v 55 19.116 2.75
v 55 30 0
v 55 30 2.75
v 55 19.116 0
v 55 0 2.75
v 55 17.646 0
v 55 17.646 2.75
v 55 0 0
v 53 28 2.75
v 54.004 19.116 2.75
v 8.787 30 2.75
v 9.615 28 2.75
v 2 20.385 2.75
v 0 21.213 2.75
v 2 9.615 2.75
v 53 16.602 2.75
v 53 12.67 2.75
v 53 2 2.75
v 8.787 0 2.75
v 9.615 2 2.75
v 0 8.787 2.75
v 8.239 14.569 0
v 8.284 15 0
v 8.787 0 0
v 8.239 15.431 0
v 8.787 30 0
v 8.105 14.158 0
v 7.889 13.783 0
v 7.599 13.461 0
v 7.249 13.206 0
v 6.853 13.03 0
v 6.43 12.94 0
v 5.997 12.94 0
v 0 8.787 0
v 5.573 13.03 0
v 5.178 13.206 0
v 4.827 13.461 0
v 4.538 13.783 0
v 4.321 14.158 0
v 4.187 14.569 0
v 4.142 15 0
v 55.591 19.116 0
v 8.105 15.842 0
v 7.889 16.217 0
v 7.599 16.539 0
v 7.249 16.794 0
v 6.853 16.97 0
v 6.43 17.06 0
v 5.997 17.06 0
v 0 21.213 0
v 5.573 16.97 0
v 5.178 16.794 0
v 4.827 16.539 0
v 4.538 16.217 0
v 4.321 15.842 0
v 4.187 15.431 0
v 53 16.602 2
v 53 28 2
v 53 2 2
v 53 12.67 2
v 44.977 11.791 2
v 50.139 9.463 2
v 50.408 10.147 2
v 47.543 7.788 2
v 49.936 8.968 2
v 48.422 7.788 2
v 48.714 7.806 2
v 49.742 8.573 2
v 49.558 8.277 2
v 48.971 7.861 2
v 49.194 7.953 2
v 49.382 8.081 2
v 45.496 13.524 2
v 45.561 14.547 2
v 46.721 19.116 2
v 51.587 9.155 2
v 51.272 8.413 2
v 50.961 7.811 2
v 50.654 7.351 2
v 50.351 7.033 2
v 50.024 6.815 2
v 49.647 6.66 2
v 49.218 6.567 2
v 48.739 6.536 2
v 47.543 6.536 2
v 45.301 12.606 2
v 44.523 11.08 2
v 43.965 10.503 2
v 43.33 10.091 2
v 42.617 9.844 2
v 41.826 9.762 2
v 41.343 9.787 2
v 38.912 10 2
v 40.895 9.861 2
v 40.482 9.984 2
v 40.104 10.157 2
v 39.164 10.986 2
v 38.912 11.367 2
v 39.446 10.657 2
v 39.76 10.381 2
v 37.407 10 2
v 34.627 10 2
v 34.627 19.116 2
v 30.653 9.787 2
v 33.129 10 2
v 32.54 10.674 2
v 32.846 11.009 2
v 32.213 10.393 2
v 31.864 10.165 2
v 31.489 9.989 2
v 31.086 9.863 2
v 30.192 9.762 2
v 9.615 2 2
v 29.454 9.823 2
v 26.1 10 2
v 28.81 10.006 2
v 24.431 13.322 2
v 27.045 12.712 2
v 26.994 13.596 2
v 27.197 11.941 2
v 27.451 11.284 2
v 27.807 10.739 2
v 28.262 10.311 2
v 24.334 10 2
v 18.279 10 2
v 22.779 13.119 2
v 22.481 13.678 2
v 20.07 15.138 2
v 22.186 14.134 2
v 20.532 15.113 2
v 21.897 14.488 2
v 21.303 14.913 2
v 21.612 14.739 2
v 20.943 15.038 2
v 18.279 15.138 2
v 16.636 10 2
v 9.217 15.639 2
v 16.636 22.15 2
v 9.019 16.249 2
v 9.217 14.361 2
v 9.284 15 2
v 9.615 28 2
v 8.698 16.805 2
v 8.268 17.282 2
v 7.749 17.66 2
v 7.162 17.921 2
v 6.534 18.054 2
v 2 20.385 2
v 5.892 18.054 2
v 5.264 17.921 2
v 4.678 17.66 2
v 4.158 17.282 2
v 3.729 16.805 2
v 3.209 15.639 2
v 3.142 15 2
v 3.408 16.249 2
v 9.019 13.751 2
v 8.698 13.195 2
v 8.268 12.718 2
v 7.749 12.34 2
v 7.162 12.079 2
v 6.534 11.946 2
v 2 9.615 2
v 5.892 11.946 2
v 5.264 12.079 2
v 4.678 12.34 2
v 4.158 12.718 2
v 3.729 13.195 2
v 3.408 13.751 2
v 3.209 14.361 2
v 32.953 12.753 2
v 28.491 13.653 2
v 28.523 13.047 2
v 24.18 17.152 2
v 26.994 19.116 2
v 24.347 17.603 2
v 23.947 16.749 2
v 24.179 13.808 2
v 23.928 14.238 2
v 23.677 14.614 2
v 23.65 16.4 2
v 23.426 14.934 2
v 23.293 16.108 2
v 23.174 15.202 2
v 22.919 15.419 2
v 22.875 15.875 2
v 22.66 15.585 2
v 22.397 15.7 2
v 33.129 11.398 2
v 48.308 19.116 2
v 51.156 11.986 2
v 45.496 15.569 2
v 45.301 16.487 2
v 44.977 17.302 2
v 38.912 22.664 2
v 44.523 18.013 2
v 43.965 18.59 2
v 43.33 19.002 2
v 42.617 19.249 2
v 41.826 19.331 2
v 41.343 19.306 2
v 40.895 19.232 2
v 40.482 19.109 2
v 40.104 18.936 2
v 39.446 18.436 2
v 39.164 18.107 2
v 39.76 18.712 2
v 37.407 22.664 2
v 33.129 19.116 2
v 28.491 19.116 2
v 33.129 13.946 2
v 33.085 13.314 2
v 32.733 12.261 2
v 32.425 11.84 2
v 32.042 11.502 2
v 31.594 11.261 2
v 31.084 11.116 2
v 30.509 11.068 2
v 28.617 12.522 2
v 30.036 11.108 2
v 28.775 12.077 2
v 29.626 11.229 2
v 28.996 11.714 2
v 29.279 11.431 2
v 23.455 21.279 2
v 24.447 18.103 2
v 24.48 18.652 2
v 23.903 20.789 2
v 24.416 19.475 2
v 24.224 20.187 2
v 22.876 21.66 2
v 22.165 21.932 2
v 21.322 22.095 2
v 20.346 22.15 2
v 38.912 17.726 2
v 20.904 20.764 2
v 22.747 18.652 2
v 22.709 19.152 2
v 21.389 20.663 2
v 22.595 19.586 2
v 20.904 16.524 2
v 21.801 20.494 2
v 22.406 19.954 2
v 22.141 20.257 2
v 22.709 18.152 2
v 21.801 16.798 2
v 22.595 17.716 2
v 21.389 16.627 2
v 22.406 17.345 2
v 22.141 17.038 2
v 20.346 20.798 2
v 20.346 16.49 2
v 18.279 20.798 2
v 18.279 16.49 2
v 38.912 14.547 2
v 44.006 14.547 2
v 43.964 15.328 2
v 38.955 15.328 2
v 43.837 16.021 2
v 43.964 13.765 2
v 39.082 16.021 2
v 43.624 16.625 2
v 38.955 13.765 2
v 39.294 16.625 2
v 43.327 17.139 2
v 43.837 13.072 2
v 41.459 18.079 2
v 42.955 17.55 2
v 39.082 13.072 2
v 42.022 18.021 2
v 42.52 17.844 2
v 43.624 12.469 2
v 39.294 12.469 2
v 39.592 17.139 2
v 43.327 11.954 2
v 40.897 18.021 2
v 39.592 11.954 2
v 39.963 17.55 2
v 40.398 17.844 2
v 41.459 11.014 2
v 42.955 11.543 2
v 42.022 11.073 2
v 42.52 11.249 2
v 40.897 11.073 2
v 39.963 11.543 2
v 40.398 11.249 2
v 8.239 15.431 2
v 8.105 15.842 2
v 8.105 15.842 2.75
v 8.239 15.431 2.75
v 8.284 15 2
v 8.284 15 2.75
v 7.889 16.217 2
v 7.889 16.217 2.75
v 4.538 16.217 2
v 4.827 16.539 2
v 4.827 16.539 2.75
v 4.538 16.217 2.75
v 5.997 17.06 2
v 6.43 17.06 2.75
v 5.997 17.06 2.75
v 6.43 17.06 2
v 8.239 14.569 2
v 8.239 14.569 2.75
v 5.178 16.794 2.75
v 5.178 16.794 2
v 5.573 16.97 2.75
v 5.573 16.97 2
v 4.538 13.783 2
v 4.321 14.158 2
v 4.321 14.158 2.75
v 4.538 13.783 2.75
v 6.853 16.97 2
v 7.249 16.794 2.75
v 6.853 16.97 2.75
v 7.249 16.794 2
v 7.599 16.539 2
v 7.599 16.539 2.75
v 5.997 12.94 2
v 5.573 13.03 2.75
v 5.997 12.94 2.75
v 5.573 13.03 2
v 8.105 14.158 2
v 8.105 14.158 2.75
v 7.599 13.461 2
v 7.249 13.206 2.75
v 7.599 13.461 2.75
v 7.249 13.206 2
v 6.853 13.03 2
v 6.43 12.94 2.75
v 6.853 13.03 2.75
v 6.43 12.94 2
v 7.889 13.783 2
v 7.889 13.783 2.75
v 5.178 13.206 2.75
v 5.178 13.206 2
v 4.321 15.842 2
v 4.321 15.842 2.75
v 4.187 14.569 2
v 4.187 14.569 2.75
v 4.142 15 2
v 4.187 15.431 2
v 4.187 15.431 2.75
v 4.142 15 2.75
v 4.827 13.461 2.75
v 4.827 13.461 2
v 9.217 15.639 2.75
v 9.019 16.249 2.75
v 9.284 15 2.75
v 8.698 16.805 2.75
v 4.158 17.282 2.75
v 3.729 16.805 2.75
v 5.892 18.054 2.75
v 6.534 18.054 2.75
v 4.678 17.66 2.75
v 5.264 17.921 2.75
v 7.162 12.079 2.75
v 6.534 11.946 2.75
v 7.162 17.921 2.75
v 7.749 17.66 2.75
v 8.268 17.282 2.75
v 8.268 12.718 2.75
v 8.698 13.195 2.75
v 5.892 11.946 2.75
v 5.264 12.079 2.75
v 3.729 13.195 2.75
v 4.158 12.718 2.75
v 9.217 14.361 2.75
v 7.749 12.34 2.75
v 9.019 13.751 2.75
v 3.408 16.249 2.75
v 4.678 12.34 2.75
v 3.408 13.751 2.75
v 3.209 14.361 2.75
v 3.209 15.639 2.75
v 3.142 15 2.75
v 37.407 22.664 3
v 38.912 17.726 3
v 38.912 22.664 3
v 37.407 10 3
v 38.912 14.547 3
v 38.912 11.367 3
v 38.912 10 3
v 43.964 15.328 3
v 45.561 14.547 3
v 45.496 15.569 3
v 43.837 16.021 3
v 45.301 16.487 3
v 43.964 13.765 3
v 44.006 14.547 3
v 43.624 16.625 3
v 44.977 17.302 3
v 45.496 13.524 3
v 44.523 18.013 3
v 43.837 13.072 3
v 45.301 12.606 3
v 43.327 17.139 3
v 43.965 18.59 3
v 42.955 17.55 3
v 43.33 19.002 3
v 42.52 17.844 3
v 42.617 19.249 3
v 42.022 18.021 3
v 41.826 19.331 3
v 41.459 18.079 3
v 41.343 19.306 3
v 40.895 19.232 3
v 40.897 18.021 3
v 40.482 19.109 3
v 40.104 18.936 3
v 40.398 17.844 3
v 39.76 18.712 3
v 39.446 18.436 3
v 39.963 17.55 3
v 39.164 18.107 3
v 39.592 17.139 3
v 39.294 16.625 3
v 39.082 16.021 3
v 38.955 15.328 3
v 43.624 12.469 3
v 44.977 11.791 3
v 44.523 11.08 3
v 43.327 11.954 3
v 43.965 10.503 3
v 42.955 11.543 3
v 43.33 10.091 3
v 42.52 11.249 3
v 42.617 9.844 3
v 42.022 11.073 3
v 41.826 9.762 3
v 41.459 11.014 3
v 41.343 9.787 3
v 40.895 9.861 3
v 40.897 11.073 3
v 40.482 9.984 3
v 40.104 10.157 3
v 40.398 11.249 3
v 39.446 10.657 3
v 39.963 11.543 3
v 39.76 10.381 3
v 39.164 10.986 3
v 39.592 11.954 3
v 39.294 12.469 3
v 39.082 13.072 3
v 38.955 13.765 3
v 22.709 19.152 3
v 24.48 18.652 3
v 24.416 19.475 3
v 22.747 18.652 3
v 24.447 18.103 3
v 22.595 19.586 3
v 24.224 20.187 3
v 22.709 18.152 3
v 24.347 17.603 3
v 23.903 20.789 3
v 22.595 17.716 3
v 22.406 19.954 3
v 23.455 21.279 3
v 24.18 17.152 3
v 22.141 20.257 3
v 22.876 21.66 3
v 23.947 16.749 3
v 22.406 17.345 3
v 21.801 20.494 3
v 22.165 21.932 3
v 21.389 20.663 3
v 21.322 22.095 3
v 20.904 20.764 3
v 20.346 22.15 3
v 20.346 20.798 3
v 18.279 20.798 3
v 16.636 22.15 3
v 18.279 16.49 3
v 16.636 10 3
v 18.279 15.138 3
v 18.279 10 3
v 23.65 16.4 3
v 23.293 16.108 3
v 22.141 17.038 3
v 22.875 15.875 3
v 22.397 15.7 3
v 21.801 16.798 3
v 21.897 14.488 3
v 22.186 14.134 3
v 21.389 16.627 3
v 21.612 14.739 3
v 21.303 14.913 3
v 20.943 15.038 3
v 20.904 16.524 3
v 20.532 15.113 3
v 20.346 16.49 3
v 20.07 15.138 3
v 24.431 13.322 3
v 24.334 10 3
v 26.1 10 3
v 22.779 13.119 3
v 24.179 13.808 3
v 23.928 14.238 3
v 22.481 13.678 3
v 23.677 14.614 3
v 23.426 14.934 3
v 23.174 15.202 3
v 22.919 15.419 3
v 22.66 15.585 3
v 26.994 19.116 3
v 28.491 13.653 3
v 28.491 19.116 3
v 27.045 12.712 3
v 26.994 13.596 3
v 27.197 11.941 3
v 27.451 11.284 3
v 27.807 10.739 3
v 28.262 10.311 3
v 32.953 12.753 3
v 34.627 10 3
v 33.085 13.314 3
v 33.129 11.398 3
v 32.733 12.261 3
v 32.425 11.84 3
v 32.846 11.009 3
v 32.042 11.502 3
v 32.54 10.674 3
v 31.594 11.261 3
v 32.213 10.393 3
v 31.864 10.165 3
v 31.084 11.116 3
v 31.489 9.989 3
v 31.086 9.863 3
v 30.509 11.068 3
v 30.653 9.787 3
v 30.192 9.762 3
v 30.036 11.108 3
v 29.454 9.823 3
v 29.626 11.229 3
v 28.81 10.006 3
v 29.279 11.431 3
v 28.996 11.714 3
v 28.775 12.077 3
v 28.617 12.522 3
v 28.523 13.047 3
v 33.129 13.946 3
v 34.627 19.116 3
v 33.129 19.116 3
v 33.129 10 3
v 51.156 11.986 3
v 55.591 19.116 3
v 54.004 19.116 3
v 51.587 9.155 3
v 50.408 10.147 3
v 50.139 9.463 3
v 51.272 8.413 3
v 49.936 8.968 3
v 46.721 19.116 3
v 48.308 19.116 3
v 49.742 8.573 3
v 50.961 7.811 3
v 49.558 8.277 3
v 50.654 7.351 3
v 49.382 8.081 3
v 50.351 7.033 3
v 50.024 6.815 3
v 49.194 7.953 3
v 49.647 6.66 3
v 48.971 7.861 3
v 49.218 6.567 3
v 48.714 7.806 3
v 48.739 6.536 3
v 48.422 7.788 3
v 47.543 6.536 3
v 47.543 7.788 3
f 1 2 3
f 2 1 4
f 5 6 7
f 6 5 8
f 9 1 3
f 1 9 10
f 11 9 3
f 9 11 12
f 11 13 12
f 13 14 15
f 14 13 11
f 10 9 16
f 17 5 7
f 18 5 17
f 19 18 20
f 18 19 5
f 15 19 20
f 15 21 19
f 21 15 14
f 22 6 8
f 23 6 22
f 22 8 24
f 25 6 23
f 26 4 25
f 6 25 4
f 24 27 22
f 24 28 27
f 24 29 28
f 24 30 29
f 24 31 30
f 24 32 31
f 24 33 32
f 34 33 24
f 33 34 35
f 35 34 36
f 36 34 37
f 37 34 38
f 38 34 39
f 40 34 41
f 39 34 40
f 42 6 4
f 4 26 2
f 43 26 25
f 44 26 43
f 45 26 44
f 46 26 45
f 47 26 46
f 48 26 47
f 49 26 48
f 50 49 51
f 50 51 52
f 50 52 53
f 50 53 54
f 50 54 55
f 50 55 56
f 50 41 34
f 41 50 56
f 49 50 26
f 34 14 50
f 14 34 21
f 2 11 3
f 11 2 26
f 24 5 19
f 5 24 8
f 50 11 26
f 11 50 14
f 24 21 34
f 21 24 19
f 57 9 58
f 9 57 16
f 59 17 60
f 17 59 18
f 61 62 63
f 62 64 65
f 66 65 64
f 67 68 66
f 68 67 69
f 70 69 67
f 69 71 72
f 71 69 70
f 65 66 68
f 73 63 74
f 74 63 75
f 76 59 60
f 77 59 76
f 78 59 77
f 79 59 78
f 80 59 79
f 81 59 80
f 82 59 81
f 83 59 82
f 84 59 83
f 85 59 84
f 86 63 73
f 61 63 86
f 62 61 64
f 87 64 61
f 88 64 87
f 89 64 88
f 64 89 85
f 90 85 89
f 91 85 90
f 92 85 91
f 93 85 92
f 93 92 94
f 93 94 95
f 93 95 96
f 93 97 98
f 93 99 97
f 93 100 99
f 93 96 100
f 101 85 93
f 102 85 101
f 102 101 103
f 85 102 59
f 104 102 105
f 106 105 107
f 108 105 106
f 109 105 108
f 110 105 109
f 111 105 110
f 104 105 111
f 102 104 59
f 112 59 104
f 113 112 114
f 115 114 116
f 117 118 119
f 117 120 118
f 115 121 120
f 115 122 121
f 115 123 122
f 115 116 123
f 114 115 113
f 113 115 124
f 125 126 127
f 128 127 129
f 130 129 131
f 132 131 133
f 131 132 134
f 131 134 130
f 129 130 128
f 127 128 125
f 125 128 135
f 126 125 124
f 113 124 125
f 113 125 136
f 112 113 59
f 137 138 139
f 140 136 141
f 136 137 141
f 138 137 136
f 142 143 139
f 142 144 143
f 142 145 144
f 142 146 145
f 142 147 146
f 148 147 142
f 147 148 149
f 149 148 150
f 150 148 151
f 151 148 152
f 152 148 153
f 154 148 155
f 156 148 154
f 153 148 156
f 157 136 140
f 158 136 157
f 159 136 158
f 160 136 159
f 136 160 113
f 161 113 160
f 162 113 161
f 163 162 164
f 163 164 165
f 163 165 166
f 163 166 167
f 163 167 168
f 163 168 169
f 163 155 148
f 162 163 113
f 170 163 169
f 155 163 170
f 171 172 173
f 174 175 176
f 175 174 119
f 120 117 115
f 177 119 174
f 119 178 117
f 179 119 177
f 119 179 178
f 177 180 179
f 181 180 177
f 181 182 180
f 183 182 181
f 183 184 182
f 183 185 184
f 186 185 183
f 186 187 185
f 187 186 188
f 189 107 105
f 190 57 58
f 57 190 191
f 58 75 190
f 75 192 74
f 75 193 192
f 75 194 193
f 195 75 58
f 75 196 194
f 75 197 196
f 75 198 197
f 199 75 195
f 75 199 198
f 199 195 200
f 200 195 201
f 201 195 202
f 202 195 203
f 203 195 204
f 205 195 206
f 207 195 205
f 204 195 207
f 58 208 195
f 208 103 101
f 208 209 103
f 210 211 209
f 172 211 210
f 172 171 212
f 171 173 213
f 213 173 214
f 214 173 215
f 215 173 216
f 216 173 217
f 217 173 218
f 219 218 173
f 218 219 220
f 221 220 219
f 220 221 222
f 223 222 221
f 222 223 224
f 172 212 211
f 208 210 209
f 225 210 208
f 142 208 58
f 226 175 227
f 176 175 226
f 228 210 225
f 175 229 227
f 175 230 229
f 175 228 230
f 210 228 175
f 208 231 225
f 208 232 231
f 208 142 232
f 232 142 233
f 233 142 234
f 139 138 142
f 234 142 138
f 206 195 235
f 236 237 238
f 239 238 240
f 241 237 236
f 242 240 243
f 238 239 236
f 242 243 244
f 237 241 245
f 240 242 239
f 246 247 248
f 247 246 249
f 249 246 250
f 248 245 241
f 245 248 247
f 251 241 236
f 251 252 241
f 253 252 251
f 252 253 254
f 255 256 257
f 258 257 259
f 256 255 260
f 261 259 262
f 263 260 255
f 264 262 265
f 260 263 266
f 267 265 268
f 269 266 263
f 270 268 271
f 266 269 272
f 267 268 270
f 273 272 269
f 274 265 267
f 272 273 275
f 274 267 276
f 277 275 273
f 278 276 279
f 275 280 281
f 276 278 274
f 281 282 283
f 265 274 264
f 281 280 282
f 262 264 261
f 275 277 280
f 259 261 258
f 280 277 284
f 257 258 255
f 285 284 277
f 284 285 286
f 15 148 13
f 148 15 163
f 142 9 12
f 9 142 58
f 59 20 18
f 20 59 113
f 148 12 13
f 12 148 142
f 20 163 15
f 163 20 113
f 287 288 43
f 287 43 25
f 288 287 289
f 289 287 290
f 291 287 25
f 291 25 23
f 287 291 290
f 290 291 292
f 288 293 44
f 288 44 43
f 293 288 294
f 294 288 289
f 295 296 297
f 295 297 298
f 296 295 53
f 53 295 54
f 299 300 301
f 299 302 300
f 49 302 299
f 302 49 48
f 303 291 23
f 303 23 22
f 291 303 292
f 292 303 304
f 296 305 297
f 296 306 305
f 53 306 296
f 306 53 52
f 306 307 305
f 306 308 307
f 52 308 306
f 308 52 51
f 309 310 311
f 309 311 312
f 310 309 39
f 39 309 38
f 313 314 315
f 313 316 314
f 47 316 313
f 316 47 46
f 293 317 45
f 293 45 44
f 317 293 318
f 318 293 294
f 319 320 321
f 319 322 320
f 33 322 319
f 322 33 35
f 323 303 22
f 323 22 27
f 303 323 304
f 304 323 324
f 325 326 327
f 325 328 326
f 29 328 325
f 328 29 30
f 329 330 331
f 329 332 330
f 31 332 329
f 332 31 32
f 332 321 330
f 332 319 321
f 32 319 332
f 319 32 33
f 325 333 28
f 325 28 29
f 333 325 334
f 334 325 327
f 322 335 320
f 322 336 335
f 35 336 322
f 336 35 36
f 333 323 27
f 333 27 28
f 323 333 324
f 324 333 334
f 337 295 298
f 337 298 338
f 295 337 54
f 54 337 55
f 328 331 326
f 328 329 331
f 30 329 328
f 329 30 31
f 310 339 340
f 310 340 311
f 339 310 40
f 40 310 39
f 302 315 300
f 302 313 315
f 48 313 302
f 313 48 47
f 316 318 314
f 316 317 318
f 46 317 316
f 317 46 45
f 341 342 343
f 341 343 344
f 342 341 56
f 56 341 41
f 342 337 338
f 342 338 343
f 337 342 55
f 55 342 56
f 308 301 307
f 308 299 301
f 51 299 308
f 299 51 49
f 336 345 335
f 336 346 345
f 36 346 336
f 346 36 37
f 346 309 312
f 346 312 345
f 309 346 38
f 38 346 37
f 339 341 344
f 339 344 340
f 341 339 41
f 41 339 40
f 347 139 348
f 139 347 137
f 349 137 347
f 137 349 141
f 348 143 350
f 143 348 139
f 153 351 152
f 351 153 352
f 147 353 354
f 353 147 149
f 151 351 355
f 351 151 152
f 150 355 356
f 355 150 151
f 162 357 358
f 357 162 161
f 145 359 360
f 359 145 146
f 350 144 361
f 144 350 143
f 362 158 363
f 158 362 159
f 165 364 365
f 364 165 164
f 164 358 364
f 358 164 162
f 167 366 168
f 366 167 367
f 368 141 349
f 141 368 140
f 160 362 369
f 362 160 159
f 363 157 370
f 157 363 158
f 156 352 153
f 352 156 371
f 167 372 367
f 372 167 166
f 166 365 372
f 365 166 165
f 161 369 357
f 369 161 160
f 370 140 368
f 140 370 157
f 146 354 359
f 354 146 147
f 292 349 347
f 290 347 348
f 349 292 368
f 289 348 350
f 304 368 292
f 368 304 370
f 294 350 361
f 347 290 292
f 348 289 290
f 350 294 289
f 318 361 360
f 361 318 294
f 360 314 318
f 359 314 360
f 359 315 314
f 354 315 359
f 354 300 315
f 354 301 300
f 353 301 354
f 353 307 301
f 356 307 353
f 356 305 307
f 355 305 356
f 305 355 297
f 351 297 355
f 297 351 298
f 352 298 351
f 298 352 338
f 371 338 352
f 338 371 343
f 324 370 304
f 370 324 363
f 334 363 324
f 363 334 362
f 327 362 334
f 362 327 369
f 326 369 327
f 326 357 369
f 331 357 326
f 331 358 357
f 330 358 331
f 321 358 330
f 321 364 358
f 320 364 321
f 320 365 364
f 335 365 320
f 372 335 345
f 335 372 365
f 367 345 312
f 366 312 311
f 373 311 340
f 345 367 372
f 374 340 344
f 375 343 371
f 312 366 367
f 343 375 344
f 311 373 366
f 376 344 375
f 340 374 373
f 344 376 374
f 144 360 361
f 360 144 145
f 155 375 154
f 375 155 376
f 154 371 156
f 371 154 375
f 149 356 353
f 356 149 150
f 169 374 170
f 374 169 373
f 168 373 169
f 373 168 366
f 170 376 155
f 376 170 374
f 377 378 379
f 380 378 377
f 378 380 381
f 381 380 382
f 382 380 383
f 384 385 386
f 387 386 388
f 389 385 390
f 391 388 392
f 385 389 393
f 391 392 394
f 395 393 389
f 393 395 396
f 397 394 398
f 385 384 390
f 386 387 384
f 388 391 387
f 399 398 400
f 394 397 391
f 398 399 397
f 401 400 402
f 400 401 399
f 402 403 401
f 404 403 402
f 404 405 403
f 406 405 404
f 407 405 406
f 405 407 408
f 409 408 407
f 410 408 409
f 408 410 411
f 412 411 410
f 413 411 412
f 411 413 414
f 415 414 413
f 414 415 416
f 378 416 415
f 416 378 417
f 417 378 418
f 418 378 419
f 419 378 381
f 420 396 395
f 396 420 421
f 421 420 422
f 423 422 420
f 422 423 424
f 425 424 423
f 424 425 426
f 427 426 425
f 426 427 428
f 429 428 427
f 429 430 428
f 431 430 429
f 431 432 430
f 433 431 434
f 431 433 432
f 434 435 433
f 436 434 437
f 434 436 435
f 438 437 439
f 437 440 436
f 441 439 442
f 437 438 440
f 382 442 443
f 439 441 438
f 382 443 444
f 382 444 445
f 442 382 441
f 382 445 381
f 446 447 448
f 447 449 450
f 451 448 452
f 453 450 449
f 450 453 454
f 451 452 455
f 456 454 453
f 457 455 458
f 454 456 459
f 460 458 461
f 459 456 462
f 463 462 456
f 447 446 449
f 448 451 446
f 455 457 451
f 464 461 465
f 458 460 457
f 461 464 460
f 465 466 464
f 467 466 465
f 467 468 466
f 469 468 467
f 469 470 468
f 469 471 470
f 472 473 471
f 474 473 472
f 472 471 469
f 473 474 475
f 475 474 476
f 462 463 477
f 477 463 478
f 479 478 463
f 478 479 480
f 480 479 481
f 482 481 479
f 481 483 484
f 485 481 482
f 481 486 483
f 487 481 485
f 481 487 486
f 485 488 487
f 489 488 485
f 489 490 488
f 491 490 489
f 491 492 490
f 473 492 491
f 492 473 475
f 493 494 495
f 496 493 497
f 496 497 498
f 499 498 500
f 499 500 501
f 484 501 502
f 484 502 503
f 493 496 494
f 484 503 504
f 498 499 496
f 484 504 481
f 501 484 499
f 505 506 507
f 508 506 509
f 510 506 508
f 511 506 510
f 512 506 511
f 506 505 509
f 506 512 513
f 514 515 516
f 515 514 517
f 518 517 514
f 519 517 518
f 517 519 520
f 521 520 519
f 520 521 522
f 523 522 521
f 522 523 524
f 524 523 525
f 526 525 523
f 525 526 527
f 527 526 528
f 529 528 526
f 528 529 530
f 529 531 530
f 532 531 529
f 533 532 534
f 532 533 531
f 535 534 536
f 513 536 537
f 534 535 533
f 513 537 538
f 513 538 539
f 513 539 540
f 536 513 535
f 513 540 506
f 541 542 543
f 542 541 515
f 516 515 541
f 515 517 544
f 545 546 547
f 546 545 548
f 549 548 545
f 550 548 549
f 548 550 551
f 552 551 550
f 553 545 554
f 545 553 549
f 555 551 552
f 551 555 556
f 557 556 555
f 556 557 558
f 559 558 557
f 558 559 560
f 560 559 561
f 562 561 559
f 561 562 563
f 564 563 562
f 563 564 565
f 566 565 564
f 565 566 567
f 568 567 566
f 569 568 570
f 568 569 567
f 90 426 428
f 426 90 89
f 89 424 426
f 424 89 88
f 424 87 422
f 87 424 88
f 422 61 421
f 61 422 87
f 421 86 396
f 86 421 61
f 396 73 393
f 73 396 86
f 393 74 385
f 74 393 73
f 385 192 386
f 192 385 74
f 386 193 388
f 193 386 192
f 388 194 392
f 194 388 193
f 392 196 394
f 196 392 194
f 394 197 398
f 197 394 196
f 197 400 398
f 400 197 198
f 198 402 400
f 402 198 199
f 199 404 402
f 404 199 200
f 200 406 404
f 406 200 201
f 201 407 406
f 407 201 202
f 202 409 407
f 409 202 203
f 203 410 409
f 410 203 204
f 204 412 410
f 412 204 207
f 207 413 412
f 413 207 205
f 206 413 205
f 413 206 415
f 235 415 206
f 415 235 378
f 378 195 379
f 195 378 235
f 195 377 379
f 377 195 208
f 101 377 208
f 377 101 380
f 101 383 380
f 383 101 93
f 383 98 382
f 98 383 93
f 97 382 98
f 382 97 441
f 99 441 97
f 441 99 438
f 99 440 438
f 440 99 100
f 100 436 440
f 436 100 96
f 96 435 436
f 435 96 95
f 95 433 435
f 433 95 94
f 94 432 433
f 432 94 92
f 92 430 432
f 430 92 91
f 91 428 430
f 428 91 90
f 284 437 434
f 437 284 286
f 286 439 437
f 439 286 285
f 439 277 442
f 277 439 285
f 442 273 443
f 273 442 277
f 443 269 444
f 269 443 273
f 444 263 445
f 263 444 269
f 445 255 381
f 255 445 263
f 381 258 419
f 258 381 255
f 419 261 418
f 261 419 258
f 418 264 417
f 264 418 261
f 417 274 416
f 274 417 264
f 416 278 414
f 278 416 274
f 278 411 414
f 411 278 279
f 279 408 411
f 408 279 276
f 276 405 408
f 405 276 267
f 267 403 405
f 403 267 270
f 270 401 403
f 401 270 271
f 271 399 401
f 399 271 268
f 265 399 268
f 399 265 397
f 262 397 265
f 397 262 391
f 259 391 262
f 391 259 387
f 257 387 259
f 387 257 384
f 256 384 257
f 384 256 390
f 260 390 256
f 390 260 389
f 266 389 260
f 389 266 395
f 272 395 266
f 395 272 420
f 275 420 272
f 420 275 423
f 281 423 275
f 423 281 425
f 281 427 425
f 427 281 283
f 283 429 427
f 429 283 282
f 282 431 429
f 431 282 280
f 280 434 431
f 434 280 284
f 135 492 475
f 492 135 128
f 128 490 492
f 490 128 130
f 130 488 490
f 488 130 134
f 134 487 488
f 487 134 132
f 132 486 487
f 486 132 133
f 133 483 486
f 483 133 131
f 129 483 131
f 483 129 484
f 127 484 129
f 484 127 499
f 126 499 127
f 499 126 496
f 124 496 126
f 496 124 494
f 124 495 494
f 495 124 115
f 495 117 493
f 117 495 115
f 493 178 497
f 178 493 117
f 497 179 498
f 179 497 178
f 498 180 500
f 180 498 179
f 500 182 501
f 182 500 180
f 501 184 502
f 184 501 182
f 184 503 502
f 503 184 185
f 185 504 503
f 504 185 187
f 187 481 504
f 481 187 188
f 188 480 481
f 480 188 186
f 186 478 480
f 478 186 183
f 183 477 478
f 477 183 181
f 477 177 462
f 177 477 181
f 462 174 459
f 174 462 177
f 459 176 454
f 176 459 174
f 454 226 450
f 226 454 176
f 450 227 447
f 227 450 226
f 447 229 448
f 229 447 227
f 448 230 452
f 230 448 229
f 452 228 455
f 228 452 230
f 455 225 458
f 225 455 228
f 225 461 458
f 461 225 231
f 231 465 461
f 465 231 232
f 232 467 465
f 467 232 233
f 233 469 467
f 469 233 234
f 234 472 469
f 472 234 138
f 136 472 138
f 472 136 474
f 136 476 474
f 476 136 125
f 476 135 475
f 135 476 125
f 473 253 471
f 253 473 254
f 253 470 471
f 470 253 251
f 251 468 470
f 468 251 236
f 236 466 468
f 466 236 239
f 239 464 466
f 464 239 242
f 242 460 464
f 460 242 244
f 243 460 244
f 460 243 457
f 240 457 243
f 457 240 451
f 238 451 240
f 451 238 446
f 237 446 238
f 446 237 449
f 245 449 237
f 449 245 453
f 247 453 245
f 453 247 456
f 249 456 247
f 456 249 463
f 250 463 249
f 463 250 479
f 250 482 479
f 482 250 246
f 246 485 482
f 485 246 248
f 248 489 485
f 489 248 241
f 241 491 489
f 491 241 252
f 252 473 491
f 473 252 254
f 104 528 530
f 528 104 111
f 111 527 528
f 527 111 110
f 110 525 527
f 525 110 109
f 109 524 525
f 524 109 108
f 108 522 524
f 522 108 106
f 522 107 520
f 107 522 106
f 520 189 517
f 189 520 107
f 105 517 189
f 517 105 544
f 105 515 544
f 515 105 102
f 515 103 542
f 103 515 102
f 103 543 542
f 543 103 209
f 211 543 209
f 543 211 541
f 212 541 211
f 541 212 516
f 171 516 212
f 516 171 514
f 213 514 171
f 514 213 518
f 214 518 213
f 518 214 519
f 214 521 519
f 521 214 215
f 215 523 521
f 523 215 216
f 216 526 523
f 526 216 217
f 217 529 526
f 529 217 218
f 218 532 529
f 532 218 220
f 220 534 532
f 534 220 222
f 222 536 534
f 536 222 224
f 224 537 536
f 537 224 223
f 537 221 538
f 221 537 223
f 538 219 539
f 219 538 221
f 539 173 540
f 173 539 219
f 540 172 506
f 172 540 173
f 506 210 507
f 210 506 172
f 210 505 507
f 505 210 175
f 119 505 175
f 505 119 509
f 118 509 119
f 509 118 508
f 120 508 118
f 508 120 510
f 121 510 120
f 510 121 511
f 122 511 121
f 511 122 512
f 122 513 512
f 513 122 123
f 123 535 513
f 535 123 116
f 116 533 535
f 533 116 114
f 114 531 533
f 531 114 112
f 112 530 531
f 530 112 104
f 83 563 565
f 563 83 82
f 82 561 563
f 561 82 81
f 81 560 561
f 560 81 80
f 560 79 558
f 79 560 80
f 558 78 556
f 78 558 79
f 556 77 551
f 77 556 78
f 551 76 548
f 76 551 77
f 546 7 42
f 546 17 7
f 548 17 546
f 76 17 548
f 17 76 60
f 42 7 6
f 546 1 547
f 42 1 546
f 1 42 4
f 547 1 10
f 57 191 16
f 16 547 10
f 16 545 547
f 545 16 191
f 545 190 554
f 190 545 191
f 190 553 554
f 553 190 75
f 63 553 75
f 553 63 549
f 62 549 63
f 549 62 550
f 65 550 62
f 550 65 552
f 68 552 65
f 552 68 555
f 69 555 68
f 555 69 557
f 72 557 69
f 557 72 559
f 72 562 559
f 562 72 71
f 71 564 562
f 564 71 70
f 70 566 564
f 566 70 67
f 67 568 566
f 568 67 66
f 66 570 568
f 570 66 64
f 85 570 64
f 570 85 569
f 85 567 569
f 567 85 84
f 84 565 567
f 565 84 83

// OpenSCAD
//Personalized and Parameterized Gift Tags
//By Brad Wagner (c) 2012
//Creative Commons License, yada yada.

//I made these for my new printer for Christmas giving/showing off. Damn I'm good. :P

//Print these with a 2 solid layers top and bottom and one perimeter for best results.

/*[Text]*/
tag_name="Ruby";

tag_width = 55; //[25,30,35,40,45,50,55,60,65,70,75,80,85,90,95,100,105,110,115,120,125,130,135,140,145,150,155,160,165,170]

tag_height = 30; //[5,10,15,20,25,30,35,40,45,50]

text_centering_height = 10; 

text_centering_left_to_right = 15; 

What_font="Yesteryear"; //[Abril Fatface,Aclonica,Acme,Advent Pro,Akronim,Aladin,Alegreya,Alegreya Sans,Alegreya SC,Alex Brush,Alfa Slab One,Alice,Amaranth,Architects Daughter,Archivo Black,Archivo Narrow,Arimo,Arvo,Asap,Astloch,Asul,Averia Libre,Averia Serif Libre,Bangers,Basic,Belgrano,Berkshire Swash,Bigshot One,Bilbo Swash Caps,Black Ops One,Bonbon,Bowlby One SC,Brawler,Bubblegum Sans,Butterfly Kids,Cabin Condensed,Caesar Dressing,Cagliostro,Calligraffitti,Capriola,Carter One,Changa One,Chango,Chelsea Market,Cherry Cream Soda,Chewy,Chicle,Chivo,Clicker Script,Coming Soon,Concert One,Condiment,Cookie,Courgette,Covered By Your Grace,Crimson Text,Dancing Script,DejaVu Sans,DejaVu Serif,Dhurjati,Doppio One,Dosis,Droid Sans,Eagle Lake,Electrolize,Emilys Candy,Encode Sans,Encode Sans Compressed,Euphoria Script,Exo,Exo 2,Faster One,Federo,Finger Paint,Fjord One,Fontdiner Swanky,Freckle Face,Fruktur,Gabriela,Geo,Germania One,Give You Glory,Gloria Hallelujah,Goudy Bookletter 1911,Graduate,Grand Hotel,Great Vibes,Griffy,Hanalei Fill,Happy Monkey,Henny Penny,Hind,IM Fell English SC,Indie Flower,Irish Grover,Italianno,Jacques Francois Shadow,Jolly Lodger,Josefin Slab,Joti One,Judson,Just Another Hand,Kalam,Kameron,Karma,Kavoon,Knewave,Kranky,Kristi,Laila,Lakki Reddy,Lancelot,Lato,Leckerli One,Ledger,Lekton,Lemon One,Liberation Sans,Libre Caslon Text,Life Savers,Lilita One,Lily Script One,Limelight,Lobster,Lobster Two,Londrina Outline,Londrina Shadow,Londrina Solid,Lora,Love Ya Like A Sister,Loved by the King,Lovers Quarrel,Luckiest Guy,Lusitana,Macondo,Macondo Swash Caps,Mako,Marck Script,Margarine,Marko One,Maven Pro,McLaren,MedievalSharp,Merienda One,Merriweather,Mervale Script,Metal Mania,Metrophobic,Milonga,Miltonian Tattoo,Miss Fajardose,Molle,Montez,Montserrat,Mr De Haviland,Mystery Quest,Neucha,New Rocker,Niconne,Nosifer,Nothing You Could Do,Noto Sans Oriya,Noto Serif,Nova Square,Nunito,Old Standard TT,Oleo Script,Oleo Script Swash Caps,Orbitron,Oregano,Orienta,Original Surfer,Oswald,Over the Rainbow,Overlock,Oxygen,Pacifico,Paprika,Parisienne,Patrick Hand SC,Paytone One,Peralta,Permanent Marker,Piedra,Pirata One,Play,Playball,Poetsen One,Poppins,Press Start 2P,Princess Sofia,PT Mono,Qwigley,Racing Sans One,Raleway,Rancho,Ranga,Ribeye,Roboto,Roboto Condensed,Roboto Slab,Rochester,Rock Salt,Rubik One,Sail,Salsa,Sansita One,Sarina,Satisfy,Schoolbell,Seaweed Script,Sevillana,Shadows Into Light,Shadows Into Light Two,Share,Six Caps,Skranji,Source Sans Pro,Spicy Rice,Stardos Stencil,Stoke,Syncopate,Teko,Terminal Dosis,The Girl Next Door,Tillana,Timmana,Titillium Web,Ubuntu,Ultra,Underdog,UnifrakturCook,UnifrakturMaguntia,Vampiro One,Vidaloka,Viga,Voces,Volkhov,Vollkorn,Voltaire,Waiting for the Sunrise,Wallpoet,Wellfleet,Wendy One,Yellowtail,Yesteryear,Zeyada]

font_size = 12; //[5,6,7,8,9,10,11,12,13,14,15,16,17,18,19]

// Hidden parameter
module stopCustomizer(){}

depth = 2;
letter_height = .75;
$fn=30;

//Let x be the length of one of three tag sides
x = (tag_height*sqrt(2)) / (2 + sqrt(2));

module tagName()
{
    linear_extrude(height = 3)
    text(tag_name, size = font_size, font = What_font);
}

difference() {
	tag(tag_width, tag_height, depth + letter_height);
	translate([2,2,depth]) tag(tag_width-4, tag_height-4, depth);
	translate([x/2, tag_height/2, 0]) cylinder(depth+letter_height, x/6, x/6);
}

difference() {
	translate([x/2, tag_height/2, 0]) cylinder(depth+letter_height, x/6+1, x/6+1);
#	translate([x/2, tag_height/2, 0]) cylinder(depth+letter_height, x/6, x/6);
}

module tag(w, h, d) {

	p_x = (h*sqrt(2)) / (2 + sqrt(2));

	difference() {
		cube([w, h, d]);

		translate([-p_x/2, h/2, 0]) rotate([0,0,45]) cube([50,50,d]);
		translate([-p_x/2, h/2, 0]) rotate([0,0,225]) cube([50,50,d]);
	}

}
translate([text_centering_left_to_right, text_centering_height,0]) tagName();
